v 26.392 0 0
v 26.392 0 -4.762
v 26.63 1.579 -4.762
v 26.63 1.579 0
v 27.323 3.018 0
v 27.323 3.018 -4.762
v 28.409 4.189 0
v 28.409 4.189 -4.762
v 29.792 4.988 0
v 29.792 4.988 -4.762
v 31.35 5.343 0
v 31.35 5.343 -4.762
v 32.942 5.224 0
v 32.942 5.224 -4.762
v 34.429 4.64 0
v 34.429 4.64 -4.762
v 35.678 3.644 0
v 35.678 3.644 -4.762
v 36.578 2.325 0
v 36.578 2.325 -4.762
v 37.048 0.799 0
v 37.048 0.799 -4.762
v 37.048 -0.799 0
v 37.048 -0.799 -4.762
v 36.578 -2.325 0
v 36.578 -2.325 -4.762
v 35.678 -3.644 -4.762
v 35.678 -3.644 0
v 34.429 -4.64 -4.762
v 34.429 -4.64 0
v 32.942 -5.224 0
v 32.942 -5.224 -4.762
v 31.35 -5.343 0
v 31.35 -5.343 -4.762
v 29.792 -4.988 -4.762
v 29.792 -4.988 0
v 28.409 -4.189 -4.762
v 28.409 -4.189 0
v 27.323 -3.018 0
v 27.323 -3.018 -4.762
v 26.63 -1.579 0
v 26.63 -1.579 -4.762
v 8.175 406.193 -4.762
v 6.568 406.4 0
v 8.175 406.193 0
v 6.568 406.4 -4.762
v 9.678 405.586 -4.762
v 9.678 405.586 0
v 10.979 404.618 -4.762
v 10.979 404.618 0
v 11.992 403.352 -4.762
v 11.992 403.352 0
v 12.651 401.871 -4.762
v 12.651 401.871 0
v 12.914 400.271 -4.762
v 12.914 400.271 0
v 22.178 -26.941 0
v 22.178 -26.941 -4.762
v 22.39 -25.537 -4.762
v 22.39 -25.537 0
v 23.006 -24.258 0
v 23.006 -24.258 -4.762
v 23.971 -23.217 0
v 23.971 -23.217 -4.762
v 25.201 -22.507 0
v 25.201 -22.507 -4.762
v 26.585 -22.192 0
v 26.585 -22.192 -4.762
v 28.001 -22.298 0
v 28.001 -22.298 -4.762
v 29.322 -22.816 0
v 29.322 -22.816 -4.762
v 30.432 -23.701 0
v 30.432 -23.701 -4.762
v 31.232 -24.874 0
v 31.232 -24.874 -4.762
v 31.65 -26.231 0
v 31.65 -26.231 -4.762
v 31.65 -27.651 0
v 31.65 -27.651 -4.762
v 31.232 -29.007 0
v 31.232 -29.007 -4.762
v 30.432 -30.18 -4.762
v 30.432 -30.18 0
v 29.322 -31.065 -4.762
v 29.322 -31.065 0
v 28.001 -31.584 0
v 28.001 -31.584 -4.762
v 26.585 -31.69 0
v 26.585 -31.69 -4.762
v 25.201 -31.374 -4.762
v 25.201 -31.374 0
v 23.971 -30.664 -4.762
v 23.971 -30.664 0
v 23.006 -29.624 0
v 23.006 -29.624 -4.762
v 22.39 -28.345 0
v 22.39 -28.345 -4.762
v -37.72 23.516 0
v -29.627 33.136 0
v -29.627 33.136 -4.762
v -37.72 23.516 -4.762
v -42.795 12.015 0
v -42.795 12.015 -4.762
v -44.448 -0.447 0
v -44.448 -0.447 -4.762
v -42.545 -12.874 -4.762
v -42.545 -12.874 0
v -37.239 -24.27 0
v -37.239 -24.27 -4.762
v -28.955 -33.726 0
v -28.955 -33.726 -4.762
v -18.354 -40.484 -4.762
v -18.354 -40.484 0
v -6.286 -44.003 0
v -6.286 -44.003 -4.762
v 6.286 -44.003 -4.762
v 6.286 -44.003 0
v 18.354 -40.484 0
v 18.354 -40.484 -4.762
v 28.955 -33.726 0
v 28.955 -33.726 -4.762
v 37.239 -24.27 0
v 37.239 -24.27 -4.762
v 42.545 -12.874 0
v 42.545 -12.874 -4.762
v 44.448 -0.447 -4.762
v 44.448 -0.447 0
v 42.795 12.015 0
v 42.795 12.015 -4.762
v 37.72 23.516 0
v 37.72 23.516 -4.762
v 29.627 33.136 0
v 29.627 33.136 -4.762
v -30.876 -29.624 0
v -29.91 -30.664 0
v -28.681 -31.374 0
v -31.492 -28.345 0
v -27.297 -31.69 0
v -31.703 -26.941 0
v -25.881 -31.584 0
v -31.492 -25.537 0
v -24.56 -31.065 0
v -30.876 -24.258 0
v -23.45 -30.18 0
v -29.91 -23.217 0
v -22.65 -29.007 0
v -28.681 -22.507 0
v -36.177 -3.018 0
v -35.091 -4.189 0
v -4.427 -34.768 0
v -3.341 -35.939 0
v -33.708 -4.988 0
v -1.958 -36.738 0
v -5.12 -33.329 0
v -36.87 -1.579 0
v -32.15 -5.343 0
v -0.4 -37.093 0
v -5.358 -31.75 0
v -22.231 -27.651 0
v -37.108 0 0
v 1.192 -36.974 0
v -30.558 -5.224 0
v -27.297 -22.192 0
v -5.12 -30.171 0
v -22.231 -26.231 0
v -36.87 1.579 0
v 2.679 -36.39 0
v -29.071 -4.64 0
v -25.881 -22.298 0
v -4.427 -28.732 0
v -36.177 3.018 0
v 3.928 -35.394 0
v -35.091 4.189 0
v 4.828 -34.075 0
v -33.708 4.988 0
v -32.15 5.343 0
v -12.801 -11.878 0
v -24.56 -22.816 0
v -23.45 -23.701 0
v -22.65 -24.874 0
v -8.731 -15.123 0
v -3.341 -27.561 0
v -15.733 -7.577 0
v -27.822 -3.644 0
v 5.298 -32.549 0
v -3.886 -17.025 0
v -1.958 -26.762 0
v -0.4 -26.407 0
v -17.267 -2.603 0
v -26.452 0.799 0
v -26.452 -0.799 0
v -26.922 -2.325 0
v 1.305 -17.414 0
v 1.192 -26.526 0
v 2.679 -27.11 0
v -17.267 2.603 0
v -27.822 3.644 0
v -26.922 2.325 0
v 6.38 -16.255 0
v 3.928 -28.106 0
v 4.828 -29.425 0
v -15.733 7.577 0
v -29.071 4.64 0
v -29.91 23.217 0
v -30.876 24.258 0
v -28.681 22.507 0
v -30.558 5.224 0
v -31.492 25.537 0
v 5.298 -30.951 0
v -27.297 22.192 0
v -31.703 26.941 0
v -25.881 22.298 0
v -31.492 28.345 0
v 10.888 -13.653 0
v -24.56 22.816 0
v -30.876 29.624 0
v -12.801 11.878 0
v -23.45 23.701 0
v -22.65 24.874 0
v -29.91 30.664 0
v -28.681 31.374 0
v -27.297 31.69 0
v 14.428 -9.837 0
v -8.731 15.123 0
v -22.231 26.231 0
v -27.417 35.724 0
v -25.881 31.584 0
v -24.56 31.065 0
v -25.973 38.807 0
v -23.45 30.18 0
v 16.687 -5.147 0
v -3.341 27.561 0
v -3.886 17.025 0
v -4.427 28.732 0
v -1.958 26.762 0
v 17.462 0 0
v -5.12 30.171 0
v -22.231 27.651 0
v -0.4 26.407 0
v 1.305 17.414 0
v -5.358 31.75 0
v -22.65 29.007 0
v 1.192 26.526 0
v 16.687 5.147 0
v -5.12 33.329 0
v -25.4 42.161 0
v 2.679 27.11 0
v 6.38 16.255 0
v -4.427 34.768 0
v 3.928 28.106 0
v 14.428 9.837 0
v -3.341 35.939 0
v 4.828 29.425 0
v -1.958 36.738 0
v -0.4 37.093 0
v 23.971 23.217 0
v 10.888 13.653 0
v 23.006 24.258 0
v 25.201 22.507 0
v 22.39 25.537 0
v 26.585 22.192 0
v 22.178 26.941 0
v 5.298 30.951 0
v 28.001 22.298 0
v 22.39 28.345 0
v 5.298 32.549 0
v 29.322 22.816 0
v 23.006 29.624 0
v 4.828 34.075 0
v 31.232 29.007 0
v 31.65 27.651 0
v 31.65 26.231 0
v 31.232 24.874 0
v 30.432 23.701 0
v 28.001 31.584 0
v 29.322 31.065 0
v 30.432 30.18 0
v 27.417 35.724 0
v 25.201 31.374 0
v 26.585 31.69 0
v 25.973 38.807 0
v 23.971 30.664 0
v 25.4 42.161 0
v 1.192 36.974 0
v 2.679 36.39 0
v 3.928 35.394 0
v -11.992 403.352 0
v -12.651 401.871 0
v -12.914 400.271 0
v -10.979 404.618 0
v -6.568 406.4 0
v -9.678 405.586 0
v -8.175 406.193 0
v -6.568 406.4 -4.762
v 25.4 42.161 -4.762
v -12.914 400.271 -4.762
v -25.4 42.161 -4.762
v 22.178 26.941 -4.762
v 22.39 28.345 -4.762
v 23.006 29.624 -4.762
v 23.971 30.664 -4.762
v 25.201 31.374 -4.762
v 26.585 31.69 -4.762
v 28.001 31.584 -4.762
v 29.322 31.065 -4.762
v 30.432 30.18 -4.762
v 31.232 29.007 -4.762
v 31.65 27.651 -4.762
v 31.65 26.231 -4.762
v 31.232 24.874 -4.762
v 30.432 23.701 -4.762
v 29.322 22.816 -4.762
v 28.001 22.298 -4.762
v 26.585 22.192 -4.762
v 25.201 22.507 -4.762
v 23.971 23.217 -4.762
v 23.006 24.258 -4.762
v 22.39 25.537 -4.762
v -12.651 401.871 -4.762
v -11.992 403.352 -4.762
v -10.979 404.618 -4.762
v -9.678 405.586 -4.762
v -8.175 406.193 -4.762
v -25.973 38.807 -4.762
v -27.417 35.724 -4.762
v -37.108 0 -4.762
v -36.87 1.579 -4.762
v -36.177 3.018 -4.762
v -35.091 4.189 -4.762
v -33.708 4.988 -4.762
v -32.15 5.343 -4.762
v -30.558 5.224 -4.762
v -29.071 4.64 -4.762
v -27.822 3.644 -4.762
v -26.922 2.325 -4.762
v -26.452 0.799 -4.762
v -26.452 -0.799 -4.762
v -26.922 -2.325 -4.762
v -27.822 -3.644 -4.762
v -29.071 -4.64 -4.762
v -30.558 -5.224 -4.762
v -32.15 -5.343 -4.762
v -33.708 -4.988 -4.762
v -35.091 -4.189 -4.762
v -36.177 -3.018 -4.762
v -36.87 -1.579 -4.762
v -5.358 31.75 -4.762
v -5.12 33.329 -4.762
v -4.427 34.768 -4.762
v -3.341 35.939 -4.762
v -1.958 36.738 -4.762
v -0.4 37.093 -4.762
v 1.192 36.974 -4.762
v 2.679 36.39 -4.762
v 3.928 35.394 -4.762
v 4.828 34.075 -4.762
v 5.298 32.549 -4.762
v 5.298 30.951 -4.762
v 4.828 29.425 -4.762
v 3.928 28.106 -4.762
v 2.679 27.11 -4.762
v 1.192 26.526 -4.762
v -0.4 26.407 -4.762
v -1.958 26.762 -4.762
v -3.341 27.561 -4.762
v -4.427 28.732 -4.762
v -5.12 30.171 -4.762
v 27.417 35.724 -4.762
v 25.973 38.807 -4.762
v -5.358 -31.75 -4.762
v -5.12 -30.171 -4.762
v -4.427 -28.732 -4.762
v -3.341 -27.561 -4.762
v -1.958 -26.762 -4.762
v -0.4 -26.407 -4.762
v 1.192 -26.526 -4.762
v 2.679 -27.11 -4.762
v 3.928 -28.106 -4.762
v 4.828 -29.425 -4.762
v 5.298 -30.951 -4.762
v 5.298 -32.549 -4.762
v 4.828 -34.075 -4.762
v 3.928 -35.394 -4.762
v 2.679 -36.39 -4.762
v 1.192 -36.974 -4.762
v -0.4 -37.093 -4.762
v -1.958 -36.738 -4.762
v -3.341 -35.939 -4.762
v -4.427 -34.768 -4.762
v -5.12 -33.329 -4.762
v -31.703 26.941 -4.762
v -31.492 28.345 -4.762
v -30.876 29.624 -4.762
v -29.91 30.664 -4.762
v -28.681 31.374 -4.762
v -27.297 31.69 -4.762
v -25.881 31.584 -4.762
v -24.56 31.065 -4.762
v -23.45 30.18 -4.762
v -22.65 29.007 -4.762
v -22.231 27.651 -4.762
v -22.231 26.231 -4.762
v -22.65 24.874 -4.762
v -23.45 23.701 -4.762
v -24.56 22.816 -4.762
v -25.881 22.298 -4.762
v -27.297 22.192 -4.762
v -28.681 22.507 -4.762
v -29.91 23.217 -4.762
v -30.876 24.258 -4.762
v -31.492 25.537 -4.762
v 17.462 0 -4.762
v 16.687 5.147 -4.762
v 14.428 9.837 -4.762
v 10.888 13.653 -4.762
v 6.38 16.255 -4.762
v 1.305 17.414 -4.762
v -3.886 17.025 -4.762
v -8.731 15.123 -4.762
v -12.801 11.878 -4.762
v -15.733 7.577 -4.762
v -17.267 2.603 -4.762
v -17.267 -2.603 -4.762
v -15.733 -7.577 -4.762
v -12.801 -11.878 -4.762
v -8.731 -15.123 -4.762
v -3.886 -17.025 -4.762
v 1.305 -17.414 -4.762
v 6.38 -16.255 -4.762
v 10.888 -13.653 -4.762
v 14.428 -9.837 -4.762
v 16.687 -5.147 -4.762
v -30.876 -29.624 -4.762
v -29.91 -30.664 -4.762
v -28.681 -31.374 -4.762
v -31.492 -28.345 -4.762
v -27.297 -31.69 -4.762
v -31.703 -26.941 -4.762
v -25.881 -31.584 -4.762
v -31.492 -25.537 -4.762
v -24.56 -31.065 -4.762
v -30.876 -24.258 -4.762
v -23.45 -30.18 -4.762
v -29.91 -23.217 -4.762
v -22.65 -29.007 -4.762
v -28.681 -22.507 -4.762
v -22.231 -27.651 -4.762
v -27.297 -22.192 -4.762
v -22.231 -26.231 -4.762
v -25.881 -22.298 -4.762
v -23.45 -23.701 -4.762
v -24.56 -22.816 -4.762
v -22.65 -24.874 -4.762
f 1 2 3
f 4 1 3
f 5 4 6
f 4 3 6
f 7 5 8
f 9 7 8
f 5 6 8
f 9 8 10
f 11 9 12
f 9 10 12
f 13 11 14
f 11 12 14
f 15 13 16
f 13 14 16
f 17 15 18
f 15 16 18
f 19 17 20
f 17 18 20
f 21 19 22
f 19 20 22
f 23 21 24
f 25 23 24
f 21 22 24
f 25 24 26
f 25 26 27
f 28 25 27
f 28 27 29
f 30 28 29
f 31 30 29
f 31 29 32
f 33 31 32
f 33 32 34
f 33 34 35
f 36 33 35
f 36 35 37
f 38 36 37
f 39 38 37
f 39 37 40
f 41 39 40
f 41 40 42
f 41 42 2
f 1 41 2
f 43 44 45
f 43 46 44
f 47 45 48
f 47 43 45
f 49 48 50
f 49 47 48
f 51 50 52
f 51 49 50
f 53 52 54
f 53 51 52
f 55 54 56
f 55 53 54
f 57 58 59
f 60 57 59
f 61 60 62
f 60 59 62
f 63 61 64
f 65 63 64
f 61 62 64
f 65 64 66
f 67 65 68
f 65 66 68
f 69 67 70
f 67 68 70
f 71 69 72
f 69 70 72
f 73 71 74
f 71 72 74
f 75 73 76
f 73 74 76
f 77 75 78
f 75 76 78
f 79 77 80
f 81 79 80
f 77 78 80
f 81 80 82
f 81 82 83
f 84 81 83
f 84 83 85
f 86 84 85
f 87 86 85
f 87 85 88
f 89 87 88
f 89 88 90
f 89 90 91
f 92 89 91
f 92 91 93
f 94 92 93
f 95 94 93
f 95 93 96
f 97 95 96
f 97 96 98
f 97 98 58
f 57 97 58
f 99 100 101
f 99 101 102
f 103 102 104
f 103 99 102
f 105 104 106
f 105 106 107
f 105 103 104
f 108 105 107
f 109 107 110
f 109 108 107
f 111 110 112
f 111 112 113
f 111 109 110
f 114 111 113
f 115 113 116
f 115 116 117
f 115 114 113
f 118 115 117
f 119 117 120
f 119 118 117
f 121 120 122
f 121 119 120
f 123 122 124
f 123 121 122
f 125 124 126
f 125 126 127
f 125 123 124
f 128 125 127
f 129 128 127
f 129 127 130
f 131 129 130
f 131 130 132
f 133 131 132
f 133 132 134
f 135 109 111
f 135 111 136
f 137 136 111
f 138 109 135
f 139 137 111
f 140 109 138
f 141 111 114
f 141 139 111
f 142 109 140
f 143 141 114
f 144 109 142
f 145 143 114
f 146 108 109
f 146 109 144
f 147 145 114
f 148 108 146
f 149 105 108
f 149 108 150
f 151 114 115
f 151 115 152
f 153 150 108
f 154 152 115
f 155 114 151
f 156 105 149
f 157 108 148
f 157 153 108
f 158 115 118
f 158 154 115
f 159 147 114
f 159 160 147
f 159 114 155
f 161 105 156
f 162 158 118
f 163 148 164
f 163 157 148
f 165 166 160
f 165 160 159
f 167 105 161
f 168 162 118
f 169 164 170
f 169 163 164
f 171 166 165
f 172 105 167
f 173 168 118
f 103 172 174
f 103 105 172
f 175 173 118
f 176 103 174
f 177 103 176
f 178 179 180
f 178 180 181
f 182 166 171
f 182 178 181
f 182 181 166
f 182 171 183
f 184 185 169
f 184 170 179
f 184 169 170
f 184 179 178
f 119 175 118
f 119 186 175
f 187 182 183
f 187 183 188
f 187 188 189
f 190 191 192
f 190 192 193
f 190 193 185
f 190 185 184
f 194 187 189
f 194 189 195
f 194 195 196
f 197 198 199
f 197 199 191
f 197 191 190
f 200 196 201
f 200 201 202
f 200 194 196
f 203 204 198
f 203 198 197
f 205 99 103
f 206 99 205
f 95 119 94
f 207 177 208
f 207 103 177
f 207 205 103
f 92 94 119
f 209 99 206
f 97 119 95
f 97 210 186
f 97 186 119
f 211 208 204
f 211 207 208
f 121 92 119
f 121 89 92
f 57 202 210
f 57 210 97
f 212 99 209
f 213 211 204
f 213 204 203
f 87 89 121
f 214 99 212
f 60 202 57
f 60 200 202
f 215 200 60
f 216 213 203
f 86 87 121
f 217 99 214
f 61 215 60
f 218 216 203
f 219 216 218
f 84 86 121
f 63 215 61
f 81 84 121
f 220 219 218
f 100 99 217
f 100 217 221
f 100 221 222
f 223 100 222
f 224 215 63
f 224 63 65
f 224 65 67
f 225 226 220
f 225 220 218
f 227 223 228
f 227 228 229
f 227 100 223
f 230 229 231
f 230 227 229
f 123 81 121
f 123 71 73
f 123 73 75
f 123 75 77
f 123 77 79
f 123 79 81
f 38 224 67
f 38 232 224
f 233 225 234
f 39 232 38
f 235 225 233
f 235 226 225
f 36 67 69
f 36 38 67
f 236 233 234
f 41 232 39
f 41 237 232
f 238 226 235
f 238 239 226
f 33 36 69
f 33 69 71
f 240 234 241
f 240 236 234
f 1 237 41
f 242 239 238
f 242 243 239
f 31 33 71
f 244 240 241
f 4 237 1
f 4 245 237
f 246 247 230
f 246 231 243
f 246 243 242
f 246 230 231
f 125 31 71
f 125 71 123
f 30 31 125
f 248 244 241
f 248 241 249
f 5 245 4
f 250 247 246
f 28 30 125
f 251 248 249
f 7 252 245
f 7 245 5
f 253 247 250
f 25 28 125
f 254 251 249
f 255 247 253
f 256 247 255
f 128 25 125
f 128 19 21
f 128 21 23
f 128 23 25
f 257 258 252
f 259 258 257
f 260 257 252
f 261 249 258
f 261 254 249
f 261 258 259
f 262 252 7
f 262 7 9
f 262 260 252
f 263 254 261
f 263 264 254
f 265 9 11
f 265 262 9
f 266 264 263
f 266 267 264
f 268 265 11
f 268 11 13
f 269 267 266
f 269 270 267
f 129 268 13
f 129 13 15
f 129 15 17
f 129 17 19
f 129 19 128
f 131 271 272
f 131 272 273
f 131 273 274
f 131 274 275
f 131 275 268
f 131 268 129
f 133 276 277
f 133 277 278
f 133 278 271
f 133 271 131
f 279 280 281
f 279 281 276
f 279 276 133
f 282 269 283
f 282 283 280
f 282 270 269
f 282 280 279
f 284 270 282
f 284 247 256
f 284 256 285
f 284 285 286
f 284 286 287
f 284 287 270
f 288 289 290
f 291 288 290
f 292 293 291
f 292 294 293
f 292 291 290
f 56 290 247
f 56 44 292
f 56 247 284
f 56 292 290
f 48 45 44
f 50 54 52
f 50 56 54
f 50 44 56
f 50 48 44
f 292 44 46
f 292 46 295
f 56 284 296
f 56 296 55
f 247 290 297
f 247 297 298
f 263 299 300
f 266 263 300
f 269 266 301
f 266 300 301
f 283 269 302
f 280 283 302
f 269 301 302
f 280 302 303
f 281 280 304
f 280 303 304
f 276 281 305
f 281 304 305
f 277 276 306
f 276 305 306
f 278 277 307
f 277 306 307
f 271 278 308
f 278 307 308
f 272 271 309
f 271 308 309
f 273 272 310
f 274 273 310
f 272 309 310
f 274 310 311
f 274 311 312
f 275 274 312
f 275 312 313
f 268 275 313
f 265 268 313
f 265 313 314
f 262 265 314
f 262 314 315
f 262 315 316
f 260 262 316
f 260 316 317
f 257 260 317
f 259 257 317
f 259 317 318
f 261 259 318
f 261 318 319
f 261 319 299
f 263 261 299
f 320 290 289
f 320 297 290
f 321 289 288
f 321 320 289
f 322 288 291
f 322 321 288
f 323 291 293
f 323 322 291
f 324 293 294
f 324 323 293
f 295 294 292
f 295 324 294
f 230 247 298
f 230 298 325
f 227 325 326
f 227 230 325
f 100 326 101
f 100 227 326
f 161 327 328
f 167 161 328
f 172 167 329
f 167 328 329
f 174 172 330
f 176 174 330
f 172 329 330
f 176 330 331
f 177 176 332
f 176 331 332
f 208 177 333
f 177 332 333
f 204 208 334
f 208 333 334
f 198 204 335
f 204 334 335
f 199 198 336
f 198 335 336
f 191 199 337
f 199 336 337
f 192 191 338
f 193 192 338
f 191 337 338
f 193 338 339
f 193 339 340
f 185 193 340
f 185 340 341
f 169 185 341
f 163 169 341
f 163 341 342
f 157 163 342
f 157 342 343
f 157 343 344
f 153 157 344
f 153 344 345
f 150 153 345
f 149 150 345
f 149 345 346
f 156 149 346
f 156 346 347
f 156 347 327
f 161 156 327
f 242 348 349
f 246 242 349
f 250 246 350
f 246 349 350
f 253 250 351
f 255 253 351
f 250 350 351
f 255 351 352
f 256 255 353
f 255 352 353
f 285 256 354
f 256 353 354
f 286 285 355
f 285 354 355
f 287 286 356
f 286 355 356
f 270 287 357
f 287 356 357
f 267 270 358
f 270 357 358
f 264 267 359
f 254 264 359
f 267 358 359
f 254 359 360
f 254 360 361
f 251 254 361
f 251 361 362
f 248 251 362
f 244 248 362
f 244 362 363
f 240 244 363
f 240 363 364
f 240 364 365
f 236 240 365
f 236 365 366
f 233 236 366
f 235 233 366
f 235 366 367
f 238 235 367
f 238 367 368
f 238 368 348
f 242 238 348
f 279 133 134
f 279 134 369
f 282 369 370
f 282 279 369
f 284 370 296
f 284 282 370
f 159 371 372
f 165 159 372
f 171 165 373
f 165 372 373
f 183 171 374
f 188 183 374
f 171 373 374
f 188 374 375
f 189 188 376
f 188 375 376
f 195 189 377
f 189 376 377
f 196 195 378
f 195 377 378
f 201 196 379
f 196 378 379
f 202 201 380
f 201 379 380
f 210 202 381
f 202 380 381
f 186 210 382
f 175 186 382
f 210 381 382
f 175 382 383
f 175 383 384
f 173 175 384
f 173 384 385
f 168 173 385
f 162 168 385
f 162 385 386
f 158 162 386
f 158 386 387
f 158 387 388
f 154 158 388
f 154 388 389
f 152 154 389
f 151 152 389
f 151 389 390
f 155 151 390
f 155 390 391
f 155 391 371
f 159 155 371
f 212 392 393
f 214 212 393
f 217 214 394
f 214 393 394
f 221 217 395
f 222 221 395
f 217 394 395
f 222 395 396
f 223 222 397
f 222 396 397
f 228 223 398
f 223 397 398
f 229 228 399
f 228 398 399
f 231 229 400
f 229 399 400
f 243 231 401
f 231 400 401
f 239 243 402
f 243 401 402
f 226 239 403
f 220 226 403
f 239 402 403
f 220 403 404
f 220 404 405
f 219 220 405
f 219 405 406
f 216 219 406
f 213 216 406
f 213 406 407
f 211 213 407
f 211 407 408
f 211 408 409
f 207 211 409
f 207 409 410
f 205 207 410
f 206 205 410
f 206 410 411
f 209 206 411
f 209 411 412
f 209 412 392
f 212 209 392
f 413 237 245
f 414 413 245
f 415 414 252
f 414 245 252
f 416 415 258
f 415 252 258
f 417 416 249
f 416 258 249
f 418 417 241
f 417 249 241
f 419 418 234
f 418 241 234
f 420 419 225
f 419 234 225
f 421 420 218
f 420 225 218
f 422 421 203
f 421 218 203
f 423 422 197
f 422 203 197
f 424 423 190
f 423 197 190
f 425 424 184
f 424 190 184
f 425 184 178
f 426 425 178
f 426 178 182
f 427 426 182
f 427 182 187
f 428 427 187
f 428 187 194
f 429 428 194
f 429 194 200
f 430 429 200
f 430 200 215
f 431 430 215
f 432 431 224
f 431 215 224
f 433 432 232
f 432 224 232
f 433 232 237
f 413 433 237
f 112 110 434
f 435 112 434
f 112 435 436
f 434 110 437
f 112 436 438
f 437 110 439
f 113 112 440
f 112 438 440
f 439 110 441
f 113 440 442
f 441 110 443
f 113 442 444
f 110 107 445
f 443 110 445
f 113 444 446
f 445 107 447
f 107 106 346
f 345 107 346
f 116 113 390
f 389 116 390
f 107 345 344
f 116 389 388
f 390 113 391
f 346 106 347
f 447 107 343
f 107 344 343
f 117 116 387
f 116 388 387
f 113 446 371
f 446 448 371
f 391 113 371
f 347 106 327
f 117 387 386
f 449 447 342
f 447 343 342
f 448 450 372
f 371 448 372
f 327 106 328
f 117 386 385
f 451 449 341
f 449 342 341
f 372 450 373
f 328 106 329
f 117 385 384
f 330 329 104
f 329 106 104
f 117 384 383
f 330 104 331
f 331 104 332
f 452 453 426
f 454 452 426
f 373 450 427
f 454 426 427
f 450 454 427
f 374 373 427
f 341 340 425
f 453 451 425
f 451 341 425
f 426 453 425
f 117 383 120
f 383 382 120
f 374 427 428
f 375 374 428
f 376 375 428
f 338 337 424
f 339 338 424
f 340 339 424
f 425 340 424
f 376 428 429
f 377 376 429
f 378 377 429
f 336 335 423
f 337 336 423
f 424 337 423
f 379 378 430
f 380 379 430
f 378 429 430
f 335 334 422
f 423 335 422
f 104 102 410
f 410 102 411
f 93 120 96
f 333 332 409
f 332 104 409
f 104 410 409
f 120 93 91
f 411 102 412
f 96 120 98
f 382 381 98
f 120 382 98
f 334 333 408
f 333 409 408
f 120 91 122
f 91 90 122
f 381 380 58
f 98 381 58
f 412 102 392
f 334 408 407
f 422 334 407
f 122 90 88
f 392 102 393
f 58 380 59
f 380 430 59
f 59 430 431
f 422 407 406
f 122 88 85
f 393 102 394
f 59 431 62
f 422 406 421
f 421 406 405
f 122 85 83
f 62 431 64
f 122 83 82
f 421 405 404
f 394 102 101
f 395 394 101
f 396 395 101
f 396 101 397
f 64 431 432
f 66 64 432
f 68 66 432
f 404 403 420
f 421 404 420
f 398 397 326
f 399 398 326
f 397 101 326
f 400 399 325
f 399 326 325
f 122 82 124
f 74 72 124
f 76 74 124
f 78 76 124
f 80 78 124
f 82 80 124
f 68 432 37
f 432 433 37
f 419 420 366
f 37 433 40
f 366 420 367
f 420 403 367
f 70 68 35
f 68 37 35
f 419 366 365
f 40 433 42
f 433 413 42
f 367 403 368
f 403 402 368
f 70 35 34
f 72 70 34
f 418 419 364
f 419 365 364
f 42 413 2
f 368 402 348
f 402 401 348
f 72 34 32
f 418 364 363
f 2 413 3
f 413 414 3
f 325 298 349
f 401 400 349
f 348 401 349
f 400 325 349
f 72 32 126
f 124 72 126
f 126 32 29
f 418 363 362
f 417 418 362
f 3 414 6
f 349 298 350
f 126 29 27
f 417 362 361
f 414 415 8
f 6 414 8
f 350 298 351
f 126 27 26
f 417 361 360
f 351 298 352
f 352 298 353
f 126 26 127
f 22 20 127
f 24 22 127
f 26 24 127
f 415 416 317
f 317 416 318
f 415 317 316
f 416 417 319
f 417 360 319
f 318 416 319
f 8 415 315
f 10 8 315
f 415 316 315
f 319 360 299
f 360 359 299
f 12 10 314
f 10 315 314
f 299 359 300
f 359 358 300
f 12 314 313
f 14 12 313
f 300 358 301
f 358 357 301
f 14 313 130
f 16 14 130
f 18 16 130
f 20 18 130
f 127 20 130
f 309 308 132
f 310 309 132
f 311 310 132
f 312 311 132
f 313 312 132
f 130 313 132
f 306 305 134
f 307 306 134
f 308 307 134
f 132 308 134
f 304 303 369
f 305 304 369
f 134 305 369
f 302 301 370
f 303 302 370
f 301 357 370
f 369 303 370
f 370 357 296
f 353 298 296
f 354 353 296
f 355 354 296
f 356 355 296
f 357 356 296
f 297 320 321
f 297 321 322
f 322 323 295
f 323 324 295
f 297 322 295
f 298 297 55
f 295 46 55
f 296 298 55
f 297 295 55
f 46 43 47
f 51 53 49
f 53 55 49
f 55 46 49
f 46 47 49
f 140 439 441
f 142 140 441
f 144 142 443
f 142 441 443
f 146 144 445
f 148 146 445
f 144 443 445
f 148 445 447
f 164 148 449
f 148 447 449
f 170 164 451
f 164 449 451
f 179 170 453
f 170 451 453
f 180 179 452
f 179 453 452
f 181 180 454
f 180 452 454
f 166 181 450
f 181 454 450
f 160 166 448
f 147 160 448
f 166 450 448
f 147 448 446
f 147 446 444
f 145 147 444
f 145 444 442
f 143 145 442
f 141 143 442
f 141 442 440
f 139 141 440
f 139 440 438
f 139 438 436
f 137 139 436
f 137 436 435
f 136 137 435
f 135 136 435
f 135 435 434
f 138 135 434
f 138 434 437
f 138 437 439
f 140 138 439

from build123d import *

# Parameters (mm, degrees)
F0_R     = 17.4625
F1_DEPTH = 4.7625
F2_D     = 10.71626
F3_R     = 6.35
F5_D     = 9.525


with BuildPart() as f1:
    # F0 (on Top) → F1 (new body)
    with BuildSketch(Plane.XY):
        with BuildLine():
            ThreePointArc((-25.4, 42.161447), (-26.591422, 37.216961), (-29.627334, 33.136438))
            ThreePointArc((-29.627334, 33.136438), (0, -44.45), (29.627334, 33.136438))
            ThreePointArc((29.627334, 33.136438), (26.591422, 37.216961), (25.4, 42.161447))
            Line((25.4, 42.161447), (12.7, 406.4))
            Line((12.7, 406.4), (-12.7, 406.4))
            Line((-12.7, 406.4), (-25.4, 42.161447))
        make_face()
        Circle(F0_R, mode=Mode.SUBTRACT)
    extrude(amount=-F1_DEPTH)

    # F2 (through all)
    with Locations(Plane.XY):
        with Locations((0, 31.75), (31.75, 0), (0, -31.75), (-31.75, 0)):
            Hole(F2_D / 2)

    # F3
    f3_edges = [f1.edges().sort_by_distance(p)[0] for p in [
        (-12.7, 406.4, -2.38125),
        (12.7, 406.4, -2.38125),
    ]]
    fillet(f3_edges, radius=F3_R)

    # F5 (through all)
    with Locations(Plane.XY):
        with Locations((-26.940768, 26.940768), (26.940768, 26.940768), (26.940768, -26.940768), (-26.940768, -26.940768)):
            Hole(F5_D / 2)


solid = f1.part
